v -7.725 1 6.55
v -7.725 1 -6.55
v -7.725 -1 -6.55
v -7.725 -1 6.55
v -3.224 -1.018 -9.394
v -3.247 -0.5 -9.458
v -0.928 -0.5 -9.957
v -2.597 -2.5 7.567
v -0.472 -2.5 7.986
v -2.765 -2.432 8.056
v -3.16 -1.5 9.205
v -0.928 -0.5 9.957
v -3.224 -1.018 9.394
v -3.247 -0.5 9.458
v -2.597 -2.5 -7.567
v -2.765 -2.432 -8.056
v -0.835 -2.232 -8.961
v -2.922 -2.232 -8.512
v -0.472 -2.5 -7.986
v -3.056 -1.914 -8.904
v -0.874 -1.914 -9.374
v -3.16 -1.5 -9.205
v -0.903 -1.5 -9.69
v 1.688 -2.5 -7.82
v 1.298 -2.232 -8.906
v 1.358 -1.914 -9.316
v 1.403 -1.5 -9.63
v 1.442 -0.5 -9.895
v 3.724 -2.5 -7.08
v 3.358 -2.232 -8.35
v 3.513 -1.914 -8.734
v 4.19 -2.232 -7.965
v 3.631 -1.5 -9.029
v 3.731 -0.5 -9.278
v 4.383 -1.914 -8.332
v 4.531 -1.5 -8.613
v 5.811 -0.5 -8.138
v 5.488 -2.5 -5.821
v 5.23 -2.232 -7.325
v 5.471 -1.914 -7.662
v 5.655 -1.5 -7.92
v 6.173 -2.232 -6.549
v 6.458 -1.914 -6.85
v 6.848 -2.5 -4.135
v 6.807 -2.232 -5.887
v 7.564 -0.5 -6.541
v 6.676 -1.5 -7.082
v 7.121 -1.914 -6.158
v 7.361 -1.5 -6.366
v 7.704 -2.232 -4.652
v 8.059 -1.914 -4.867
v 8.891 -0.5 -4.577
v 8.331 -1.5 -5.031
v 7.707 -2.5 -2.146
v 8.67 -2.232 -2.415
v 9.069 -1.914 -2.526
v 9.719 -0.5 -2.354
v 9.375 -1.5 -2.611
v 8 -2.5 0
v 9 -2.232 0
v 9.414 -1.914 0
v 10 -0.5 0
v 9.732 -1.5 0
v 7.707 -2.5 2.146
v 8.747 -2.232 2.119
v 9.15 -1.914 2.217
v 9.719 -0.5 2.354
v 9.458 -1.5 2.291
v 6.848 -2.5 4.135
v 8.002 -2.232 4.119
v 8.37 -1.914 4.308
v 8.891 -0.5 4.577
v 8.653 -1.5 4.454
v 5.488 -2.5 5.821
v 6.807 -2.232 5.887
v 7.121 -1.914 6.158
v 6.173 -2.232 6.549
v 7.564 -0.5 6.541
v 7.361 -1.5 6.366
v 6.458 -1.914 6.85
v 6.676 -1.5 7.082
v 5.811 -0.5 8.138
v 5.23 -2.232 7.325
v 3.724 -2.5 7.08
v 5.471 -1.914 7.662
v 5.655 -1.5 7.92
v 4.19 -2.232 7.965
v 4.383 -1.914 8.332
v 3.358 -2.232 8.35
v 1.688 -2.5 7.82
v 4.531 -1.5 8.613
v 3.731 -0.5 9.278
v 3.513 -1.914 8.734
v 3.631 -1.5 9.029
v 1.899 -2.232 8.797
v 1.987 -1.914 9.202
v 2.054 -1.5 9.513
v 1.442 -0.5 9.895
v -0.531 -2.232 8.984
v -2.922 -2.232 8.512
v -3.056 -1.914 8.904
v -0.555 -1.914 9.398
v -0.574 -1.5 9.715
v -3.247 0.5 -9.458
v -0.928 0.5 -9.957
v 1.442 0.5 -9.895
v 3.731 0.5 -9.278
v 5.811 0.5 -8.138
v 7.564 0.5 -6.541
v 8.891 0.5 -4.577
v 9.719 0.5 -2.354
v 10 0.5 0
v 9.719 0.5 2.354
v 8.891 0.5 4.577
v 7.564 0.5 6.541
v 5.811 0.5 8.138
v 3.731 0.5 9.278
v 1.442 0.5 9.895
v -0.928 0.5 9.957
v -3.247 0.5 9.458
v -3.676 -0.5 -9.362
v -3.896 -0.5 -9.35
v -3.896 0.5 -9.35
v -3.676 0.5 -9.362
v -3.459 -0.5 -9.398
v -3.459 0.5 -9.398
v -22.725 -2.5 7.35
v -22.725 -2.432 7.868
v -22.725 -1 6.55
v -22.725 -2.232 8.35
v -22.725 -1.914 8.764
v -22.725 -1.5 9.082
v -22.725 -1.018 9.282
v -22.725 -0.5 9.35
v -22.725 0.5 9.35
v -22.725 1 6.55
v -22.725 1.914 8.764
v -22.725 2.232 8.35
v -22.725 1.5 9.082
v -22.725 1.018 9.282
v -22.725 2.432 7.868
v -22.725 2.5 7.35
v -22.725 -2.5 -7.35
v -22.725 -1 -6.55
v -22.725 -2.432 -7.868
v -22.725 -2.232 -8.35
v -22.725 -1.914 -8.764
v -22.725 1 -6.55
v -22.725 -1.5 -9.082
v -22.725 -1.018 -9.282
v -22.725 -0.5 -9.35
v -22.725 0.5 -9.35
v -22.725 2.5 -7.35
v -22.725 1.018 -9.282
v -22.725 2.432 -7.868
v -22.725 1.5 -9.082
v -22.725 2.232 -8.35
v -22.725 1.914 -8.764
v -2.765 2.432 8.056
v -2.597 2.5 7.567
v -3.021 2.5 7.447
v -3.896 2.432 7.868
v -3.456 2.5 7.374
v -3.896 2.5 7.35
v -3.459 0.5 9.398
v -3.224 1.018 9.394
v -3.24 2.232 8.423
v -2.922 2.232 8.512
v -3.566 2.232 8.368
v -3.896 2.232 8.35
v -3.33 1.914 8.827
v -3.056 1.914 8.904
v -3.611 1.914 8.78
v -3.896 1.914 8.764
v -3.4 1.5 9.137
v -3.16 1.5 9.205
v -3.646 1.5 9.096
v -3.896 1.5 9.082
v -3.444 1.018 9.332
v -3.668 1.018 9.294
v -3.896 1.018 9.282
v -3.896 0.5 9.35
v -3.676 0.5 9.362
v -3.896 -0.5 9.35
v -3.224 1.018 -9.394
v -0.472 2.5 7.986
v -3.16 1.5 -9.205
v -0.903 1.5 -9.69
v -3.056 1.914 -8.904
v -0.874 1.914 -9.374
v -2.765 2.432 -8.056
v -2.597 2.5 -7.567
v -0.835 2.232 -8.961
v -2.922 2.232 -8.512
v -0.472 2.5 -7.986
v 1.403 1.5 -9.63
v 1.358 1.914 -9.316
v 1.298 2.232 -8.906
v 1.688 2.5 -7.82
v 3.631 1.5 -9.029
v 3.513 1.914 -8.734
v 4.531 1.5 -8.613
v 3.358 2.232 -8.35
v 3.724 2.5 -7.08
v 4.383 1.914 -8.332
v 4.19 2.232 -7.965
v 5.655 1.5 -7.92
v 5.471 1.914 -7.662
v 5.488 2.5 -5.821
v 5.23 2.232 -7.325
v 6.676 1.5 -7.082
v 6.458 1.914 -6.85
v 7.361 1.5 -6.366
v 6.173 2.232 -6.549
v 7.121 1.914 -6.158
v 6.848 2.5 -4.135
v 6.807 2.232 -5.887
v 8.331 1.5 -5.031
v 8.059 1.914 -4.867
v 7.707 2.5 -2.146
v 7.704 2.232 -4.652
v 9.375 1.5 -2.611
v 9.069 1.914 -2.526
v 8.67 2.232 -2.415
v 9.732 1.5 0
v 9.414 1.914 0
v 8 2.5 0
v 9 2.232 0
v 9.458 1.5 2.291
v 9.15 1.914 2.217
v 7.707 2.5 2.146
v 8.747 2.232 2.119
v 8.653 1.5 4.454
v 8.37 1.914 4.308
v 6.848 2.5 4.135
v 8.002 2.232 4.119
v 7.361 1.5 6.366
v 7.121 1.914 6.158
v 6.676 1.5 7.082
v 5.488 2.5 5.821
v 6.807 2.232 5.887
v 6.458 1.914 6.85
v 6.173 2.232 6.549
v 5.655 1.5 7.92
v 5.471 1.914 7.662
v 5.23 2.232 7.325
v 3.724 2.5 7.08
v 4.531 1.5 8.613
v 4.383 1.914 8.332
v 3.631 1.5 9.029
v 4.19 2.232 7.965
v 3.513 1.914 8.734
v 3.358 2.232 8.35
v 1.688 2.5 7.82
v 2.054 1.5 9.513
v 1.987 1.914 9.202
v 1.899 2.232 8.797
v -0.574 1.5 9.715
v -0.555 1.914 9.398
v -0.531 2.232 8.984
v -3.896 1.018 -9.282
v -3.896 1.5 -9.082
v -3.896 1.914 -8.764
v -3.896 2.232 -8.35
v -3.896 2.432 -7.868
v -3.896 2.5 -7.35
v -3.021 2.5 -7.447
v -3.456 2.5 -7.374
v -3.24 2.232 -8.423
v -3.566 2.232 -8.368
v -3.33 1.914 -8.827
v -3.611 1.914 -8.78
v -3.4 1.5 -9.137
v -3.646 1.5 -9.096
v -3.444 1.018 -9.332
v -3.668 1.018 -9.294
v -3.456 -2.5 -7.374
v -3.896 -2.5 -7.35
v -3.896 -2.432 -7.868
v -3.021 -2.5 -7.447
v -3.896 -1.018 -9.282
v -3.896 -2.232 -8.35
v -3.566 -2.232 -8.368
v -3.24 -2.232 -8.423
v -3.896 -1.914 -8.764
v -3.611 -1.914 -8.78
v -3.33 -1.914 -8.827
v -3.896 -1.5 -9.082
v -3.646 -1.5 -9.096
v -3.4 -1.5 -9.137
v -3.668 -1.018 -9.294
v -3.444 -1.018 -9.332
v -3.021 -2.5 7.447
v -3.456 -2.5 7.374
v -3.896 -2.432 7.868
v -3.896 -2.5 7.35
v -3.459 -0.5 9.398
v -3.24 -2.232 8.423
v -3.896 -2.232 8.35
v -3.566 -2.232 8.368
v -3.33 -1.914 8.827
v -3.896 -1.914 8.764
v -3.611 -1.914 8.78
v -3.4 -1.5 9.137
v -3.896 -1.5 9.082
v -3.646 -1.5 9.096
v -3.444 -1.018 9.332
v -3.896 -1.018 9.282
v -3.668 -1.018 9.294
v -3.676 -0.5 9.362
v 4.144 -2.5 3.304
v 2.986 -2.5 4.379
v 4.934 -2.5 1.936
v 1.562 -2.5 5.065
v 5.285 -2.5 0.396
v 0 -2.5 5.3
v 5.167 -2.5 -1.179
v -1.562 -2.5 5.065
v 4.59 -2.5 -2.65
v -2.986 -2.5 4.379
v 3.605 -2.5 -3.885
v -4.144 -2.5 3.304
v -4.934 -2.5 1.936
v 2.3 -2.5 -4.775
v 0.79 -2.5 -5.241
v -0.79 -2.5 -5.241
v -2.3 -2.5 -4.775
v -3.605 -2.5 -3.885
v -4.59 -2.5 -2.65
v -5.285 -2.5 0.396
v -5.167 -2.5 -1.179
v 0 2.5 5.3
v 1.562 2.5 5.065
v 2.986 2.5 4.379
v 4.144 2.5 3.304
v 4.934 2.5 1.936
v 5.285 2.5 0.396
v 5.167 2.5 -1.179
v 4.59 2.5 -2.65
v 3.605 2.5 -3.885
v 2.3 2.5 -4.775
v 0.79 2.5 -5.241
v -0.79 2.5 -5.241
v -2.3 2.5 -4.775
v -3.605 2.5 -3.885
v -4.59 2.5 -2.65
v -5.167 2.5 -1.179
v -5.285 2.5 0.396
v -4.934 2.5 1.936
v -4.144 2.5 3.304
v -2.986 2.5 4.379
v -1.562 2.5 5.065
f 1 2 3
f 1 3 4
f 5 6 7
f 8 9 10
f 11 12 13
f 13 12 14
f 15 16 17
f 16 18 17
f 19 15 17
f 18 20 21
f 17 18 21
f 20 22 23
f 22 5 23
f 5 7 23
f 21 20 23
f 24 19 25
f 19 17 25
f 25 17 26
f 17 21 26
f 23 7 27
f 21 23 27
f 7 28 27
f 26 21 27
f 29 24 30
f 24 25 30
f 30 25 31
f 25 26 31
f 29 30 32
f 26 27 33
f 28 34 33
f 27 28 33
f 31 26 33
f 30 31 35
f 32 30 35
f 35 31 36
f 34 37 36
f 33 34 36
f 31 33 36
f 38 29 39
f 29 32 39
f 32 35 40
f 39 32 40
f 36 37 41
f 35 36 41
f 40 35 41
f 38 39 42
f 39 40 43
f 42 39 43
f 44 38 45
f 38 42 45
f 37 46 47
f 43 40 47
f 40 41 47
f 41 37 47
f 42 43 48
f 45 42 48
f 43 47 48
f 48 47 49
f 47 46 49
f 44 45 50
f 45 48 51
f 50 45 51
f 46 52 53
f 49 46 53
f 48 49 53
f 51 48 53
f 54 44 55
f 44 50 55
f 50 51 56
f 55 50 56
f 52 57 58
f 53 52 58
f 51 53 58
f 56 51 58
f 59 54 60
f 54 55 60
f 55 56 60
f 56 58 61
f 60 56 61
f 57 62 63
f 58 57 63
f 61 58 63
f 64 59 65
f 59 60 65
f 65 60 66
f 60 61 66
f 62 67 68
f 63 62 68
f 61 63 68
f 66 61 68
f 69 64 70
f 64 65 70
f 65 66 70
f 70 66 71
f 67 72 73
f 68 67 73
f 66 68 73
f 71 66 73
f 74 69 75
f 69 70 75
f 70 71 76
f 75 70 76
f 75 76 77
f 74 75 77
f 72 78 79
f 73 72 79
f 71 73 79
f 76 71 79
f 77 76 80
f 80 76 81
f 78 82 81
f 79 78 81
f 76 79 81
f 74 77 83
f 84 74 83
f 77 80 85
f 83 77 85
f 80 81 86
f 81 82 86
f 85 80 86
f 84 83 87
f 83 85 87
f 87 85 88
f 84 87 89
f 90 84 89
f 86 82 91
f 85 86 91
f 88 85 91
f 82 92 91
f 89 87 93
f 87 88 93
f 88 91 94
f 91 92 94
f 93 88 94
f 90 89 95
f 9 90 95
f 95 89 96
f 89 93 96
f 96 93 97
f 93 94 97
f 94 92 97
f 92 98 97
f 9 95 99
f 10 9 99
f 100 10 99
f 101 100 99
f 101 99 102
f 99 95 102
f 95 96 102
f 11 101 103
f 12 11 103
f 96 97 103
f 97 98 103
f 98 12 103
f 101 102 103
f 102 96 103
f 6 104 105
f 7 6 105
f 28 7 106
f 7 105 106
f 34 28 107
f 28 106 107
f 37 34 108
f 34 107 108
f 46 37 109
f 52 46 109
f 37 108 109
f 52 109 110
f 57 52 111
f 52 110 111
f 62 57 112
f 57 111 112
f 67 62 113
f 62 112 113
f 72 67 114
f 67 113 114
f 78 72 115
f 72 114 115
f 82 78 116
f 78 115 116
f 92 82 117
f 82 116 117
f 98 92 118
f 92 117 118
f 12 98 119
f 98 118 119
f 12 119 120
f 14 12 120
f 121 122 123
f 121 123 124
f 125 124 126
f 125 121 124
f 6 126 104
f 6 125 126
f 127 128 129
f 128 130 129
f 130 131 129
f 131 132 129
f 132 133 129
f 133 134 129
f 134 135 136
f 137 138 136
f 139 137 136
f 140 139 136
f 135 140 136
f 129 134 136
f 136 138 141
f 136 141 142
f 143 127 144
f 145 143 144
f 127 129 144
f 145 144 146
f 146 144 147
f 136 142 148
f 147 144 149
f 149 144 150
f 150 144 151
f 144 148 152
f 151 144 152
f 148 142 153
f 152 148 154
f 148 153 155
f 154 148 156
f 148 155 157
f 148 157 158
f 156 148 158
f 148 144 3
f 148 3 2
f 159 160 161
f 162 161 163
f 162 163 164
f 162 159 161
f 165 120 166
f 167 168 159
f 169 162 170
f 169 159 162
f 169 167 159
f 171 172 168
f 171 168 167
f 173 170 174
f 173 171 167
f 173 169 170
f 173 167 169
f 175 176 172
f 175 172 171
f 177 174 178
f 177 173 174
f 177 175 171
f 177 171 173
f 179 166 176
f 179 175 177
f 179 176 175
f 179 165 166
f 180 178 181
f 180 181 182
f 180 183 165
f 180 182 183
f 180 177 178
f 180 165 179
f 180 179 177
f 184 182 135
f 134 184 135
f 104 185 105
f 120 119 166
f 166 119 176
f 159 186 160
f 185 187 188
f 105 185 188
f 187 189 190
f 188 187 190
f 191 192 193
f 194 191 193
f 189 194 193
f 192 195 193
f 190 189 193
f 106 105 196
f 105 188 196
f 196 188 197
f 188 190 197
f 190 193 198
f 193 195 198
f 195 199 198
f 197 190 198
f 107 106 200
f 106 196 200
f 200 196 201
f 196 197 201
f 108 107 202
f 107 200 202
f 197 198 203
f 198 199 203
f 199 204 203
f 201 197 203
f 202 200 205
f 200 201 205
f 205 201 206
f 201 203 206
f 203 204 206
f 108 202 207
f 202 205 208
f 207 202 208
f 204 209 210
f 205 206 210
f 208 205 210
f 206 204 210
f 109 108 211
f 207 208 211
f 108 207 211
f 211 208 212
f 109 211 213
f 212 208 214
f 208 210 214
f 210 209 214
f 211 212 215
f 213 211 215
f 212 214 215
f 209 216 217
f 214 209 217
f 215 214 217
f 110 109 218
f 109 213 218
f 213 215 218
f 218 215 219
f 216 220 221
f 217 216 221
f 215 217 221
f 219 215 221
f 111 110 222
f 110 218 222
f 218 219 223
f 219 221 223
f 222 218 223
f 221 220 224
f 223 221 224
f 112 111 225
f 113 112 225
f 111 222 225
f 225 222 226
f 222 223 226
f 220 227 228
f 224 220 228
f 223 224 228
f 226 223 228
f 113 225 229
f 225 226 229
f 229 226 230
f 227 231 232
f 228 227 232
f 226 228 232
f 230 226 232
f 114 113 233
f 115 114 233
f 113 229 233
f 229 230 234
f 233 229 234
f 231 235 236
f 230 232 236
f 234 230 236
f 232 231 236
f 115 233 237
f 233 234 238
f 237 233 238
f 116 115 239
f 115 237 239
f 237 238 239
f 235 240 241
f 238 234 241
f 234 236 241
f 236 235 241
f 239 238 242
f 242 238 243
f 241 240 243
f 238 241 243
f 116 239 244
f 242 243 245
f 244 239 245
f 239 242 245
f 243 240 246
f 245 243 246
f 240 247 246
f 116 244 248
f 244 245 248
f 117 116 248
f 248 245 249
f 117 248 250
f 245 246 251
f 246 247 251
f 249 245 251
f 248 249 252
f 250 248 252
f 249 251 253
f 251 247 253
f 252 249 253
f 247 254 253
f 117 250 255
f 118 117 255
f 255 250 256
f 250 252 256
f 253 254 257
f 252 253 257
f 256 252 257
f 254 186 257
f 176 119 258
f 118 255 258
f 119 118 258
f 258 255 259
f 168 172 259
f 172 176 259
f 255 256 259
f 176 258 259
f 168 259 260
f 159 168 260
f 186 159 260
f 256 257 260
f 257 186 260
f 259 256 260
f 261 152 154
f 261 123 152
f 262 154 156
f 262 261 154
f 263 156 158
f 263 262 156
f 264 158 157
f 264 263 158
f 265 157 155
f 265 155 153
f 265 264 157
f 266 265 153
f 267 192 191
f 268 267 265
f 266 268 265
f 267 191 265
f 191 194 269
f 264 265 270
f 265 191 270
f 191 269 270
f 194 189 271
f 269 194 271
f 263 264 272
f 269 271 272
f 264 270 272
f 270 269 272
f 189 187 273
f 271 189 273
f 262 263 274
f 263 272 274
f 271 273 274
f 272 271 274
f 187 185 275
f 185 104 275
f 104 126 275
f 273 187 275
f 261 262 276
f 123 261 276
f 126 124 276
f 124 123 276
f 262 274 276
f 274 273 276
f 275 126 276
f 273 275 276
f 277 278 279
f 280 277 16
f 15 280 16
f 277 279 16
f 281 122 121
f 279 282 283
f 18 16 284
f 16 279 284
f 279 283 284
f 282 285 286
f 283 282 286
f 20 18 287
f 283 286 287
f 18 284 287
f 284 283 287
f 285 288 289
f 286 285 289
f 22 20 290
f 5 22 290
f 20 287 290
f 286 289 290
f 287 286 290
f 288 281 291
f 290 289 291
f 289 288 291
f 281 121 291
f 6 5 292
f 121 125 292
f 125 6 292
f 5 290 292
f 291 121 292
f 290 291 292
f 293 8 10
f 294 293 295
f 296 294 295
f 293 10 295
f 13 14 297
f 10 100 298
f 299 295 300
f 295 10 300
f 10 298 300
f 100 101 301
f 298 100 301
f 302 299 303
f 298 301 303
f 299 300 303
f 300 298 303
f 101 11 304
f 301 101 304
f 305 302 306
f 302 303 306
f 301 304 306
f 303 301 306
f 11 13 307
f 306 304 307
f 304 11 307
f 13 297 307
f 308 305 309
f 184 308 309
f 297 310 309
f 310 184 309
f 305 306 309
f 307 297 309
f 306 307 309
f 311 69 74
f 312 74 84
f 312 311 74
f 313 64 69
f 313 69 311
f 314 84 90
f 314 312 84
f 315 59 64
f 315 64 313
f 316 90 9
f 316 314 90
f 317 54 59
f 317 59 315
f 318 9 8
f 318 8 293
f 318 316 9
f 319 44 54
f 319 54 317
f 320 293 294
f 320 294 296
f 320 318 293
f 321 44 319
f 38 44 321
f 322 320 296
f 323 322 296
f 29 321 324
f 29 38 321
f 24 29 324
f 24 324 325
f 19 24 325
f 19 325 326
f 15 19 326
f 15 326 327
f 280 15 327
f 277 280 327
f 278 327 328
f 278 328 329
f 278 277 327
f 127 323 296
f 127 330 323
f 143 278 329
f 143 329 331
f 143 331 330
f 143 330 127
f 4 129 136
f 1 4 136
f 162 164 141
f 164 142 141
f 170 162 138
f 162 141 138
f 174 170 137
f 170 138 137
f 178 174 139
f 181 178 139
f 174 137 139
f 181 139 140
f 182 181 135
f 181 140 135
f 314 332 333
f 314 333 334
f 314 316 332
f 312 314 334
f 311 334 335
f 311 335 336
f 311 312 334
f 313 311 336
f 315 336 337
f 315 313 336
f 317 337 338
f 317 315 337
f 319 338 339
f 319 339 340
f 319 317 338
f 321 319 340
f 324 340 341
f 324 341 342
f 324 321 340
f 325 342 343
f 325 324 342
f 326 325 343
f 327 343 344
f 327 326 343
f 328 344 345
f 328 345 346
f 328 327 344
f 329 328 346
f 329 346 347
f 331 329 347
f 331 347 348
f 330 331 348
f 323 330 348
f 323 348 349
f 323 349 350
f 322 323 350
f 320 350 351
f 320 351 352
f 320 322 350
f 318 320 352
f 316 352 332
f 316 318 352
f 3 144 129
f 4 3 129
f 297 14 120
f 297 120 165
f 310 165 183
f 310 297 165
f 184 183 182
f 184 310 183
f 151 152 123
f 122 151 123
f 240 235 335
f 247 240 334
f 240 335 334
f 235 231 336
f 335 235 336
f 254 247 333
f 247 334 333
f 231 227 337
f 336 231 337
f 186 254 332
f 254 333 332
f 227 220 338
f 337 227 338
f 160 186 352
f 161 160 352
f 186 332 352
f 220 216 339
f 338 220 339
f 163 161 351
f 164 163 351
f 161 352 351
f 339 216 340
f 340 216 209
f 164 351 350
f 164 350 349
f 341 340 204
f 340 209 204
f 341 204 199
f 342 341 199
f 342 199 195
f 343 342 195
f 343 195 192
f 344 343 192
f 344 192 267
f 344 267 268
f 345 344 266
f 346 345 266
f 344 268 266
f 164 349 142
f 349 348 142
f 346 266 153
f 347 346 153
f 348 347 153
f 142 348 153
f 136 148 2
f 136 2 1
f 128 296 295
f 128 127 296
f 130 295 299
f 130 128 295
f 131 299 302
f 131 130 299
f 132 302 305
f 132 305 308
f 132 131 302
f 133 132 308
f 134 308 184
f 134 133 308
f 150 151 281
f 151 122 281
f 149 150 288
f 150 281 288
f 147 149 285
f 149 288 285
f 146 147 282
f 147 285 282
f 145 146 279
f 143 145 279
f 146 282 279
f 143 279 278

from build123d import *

# Parameters (mm, degrees)
CROQUIS1_R              = 5.3
SALIENTE_EXTRUIR1_DEPTH = 2.5
CROQUIS2_W              = 13.1
CROQUIS2_H              = 2
CORTAR_EXTRUIR1_DEPTH   = 15
REDONDEO1_R             = 2


with BuildPart() as part:
    # Croquis1 → Saliente-Extruir1 (new, symmetric)
    with BuildSketch(Plane(origin=(0, 0, 0), x_dir=(1, 0, 0), z_dir=(0, 1, 0))):
        with BuildLine():
            Line((-22.725121358, 9.35), (-3.546477125, 9.35))
            ThreePointArc((-3.546477125, 9.35), (10, 0), (-3.546477125, -9.35))
            Line((-3.546477125, -9.35), (-22.725121358, -9.35))
            Line((-22.725121358, -9.35), (-22.725121358, 9.35))
        make_face()
        with Locations(Location((0, 0, 0), (0, 0, 270))):
            Circle(CROQUIS1_R, mode=Mode.SUBTRACT)
    extrude(amount=SALIENTE_EXTRUIR1_DEPTH, both=True)

    # Croquis2 → Cortar-Extruir1 (cut)
    with BuildSketch(Plane.ZY.offset(22.725121358)):
        Rectangle(CROQUIS2_W, CROQUIS2_H)
    extrude(amount=-CORTAR_EXTRUIR1_DEPTH, mode=Mode.SUBTRACT)

    # Redondeo1
    redondeo1_edges = [part.edges().sort_by_distance(p)[0] for p in [
        (10, 2.5, 0),
        (-13.135799242, 2.5, -9.35),
        (-13.135799242, -2.5, -9.35),
        (10, -2.5, 0),
        (-13.135799242, -2.5, 9.35),
        (-13.135799242, 2.5, 9.35),
        (-3.546477125, 0, -9.35),
        (-3.546477125, 0, 9.35),
    ]]
    fillet(redondeo1_edges, radius=REDONDEO1_R)


solid = part.part
